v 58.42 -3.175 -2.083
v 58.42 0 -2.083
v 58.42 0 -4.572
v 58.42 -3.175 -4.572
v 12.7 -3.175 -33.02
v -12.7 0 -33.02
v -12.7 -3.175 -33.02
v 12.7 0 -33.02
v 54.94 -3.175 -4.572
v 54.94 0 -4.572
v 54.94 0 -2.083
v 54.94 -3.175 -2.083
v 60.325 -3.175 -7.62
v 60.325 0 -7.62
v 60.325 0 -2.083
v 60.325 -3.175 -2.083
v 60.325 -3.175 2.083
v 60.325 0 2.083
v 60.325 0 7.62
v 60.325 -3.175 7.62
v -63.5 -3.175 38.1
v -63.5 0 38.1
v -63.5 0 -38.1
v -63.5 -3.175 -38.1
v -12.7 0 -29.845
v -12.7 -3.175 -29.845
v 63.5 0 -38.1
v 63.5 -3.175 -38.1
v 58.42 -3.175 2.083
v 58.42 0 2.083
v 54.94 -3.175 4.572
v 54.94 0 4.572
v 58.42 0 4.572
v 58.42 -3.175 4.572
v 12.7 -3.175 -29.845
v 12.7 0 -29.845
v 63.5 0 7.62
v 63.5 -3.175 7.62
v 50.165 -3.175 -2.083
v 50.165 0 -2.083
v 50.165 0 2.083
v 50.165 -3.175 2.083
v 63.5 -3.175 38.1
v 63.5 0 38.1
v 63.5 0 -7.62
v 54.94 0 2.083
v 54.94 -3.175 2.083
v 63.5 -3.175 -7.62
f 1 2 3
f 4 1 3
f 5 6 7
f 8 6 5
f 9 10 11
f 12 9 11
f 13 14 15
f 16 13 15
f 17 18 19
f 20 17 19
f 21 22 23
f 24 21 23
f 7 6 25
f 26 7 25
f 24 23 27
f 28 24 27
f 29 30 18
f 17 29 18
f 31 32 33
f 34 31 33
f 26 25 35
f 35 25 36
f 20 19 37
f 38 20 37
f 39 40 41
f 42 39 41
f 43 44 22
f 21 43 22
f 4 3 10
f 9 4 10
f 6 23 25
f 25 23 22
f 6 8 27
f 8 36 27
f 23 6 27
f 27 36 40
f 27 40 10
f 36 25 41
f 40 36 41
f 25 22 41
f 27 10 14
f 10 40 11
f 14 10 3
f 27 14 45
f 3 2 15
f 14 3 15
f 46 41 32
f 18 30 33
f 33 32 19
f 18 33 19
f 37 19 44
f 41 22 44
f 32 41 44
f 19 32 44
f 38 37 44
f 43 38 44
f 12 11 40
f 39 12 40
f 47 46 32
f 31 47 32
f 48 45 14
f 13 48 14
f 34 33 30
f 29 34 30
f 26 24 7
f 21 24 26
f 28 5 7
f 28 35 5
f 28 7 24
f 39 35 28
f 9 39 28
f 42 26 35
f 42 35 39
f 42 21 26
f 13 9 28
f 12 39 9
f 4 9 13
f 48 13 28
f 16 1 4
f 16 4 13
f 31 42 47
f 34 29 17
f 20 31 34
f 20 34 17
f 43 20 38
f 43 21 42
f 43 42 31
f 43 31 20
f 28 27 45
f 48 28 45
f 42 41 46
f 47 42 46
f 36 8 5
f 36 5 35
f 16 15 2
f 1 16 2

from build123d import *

# Parameters (mm, degrees)
F0_W     = 25.4
F0_H     = 3.175
F1_DEPTH = 3.175


with BuildPart() as f1:
    # F0 (on Front) → F1 (new body)
    with BuildSketch(Plane.XZ):
        Polygon((-63.5, -38.1), (63.5, -38.1), (63.5, -7.62), (60.325, -7.62), (60.325, -2.0828), (58.42, -2.0828), (58.42, -4.572), (54.9402, -4.572), (54.9402, -2.0828), (50.165, -2.0828), (50.165, 2.0828), (54.9402, 2.0828), (54.9402, 4.572), (58.42, 4.572), (58.42, 2.0828), (60.325, 2.0828), (60.325, 7.62), (63.5, 7.62), (63.5, 38.1), (-63.5, 38.1), align=None)
        with Locations((0, -31.4325)):
            Rectangle(F0_W, F0_H, mode=Mode.SUBTRACT)
    extrude(amount=F1_DEPTH)


solid = f1.part
